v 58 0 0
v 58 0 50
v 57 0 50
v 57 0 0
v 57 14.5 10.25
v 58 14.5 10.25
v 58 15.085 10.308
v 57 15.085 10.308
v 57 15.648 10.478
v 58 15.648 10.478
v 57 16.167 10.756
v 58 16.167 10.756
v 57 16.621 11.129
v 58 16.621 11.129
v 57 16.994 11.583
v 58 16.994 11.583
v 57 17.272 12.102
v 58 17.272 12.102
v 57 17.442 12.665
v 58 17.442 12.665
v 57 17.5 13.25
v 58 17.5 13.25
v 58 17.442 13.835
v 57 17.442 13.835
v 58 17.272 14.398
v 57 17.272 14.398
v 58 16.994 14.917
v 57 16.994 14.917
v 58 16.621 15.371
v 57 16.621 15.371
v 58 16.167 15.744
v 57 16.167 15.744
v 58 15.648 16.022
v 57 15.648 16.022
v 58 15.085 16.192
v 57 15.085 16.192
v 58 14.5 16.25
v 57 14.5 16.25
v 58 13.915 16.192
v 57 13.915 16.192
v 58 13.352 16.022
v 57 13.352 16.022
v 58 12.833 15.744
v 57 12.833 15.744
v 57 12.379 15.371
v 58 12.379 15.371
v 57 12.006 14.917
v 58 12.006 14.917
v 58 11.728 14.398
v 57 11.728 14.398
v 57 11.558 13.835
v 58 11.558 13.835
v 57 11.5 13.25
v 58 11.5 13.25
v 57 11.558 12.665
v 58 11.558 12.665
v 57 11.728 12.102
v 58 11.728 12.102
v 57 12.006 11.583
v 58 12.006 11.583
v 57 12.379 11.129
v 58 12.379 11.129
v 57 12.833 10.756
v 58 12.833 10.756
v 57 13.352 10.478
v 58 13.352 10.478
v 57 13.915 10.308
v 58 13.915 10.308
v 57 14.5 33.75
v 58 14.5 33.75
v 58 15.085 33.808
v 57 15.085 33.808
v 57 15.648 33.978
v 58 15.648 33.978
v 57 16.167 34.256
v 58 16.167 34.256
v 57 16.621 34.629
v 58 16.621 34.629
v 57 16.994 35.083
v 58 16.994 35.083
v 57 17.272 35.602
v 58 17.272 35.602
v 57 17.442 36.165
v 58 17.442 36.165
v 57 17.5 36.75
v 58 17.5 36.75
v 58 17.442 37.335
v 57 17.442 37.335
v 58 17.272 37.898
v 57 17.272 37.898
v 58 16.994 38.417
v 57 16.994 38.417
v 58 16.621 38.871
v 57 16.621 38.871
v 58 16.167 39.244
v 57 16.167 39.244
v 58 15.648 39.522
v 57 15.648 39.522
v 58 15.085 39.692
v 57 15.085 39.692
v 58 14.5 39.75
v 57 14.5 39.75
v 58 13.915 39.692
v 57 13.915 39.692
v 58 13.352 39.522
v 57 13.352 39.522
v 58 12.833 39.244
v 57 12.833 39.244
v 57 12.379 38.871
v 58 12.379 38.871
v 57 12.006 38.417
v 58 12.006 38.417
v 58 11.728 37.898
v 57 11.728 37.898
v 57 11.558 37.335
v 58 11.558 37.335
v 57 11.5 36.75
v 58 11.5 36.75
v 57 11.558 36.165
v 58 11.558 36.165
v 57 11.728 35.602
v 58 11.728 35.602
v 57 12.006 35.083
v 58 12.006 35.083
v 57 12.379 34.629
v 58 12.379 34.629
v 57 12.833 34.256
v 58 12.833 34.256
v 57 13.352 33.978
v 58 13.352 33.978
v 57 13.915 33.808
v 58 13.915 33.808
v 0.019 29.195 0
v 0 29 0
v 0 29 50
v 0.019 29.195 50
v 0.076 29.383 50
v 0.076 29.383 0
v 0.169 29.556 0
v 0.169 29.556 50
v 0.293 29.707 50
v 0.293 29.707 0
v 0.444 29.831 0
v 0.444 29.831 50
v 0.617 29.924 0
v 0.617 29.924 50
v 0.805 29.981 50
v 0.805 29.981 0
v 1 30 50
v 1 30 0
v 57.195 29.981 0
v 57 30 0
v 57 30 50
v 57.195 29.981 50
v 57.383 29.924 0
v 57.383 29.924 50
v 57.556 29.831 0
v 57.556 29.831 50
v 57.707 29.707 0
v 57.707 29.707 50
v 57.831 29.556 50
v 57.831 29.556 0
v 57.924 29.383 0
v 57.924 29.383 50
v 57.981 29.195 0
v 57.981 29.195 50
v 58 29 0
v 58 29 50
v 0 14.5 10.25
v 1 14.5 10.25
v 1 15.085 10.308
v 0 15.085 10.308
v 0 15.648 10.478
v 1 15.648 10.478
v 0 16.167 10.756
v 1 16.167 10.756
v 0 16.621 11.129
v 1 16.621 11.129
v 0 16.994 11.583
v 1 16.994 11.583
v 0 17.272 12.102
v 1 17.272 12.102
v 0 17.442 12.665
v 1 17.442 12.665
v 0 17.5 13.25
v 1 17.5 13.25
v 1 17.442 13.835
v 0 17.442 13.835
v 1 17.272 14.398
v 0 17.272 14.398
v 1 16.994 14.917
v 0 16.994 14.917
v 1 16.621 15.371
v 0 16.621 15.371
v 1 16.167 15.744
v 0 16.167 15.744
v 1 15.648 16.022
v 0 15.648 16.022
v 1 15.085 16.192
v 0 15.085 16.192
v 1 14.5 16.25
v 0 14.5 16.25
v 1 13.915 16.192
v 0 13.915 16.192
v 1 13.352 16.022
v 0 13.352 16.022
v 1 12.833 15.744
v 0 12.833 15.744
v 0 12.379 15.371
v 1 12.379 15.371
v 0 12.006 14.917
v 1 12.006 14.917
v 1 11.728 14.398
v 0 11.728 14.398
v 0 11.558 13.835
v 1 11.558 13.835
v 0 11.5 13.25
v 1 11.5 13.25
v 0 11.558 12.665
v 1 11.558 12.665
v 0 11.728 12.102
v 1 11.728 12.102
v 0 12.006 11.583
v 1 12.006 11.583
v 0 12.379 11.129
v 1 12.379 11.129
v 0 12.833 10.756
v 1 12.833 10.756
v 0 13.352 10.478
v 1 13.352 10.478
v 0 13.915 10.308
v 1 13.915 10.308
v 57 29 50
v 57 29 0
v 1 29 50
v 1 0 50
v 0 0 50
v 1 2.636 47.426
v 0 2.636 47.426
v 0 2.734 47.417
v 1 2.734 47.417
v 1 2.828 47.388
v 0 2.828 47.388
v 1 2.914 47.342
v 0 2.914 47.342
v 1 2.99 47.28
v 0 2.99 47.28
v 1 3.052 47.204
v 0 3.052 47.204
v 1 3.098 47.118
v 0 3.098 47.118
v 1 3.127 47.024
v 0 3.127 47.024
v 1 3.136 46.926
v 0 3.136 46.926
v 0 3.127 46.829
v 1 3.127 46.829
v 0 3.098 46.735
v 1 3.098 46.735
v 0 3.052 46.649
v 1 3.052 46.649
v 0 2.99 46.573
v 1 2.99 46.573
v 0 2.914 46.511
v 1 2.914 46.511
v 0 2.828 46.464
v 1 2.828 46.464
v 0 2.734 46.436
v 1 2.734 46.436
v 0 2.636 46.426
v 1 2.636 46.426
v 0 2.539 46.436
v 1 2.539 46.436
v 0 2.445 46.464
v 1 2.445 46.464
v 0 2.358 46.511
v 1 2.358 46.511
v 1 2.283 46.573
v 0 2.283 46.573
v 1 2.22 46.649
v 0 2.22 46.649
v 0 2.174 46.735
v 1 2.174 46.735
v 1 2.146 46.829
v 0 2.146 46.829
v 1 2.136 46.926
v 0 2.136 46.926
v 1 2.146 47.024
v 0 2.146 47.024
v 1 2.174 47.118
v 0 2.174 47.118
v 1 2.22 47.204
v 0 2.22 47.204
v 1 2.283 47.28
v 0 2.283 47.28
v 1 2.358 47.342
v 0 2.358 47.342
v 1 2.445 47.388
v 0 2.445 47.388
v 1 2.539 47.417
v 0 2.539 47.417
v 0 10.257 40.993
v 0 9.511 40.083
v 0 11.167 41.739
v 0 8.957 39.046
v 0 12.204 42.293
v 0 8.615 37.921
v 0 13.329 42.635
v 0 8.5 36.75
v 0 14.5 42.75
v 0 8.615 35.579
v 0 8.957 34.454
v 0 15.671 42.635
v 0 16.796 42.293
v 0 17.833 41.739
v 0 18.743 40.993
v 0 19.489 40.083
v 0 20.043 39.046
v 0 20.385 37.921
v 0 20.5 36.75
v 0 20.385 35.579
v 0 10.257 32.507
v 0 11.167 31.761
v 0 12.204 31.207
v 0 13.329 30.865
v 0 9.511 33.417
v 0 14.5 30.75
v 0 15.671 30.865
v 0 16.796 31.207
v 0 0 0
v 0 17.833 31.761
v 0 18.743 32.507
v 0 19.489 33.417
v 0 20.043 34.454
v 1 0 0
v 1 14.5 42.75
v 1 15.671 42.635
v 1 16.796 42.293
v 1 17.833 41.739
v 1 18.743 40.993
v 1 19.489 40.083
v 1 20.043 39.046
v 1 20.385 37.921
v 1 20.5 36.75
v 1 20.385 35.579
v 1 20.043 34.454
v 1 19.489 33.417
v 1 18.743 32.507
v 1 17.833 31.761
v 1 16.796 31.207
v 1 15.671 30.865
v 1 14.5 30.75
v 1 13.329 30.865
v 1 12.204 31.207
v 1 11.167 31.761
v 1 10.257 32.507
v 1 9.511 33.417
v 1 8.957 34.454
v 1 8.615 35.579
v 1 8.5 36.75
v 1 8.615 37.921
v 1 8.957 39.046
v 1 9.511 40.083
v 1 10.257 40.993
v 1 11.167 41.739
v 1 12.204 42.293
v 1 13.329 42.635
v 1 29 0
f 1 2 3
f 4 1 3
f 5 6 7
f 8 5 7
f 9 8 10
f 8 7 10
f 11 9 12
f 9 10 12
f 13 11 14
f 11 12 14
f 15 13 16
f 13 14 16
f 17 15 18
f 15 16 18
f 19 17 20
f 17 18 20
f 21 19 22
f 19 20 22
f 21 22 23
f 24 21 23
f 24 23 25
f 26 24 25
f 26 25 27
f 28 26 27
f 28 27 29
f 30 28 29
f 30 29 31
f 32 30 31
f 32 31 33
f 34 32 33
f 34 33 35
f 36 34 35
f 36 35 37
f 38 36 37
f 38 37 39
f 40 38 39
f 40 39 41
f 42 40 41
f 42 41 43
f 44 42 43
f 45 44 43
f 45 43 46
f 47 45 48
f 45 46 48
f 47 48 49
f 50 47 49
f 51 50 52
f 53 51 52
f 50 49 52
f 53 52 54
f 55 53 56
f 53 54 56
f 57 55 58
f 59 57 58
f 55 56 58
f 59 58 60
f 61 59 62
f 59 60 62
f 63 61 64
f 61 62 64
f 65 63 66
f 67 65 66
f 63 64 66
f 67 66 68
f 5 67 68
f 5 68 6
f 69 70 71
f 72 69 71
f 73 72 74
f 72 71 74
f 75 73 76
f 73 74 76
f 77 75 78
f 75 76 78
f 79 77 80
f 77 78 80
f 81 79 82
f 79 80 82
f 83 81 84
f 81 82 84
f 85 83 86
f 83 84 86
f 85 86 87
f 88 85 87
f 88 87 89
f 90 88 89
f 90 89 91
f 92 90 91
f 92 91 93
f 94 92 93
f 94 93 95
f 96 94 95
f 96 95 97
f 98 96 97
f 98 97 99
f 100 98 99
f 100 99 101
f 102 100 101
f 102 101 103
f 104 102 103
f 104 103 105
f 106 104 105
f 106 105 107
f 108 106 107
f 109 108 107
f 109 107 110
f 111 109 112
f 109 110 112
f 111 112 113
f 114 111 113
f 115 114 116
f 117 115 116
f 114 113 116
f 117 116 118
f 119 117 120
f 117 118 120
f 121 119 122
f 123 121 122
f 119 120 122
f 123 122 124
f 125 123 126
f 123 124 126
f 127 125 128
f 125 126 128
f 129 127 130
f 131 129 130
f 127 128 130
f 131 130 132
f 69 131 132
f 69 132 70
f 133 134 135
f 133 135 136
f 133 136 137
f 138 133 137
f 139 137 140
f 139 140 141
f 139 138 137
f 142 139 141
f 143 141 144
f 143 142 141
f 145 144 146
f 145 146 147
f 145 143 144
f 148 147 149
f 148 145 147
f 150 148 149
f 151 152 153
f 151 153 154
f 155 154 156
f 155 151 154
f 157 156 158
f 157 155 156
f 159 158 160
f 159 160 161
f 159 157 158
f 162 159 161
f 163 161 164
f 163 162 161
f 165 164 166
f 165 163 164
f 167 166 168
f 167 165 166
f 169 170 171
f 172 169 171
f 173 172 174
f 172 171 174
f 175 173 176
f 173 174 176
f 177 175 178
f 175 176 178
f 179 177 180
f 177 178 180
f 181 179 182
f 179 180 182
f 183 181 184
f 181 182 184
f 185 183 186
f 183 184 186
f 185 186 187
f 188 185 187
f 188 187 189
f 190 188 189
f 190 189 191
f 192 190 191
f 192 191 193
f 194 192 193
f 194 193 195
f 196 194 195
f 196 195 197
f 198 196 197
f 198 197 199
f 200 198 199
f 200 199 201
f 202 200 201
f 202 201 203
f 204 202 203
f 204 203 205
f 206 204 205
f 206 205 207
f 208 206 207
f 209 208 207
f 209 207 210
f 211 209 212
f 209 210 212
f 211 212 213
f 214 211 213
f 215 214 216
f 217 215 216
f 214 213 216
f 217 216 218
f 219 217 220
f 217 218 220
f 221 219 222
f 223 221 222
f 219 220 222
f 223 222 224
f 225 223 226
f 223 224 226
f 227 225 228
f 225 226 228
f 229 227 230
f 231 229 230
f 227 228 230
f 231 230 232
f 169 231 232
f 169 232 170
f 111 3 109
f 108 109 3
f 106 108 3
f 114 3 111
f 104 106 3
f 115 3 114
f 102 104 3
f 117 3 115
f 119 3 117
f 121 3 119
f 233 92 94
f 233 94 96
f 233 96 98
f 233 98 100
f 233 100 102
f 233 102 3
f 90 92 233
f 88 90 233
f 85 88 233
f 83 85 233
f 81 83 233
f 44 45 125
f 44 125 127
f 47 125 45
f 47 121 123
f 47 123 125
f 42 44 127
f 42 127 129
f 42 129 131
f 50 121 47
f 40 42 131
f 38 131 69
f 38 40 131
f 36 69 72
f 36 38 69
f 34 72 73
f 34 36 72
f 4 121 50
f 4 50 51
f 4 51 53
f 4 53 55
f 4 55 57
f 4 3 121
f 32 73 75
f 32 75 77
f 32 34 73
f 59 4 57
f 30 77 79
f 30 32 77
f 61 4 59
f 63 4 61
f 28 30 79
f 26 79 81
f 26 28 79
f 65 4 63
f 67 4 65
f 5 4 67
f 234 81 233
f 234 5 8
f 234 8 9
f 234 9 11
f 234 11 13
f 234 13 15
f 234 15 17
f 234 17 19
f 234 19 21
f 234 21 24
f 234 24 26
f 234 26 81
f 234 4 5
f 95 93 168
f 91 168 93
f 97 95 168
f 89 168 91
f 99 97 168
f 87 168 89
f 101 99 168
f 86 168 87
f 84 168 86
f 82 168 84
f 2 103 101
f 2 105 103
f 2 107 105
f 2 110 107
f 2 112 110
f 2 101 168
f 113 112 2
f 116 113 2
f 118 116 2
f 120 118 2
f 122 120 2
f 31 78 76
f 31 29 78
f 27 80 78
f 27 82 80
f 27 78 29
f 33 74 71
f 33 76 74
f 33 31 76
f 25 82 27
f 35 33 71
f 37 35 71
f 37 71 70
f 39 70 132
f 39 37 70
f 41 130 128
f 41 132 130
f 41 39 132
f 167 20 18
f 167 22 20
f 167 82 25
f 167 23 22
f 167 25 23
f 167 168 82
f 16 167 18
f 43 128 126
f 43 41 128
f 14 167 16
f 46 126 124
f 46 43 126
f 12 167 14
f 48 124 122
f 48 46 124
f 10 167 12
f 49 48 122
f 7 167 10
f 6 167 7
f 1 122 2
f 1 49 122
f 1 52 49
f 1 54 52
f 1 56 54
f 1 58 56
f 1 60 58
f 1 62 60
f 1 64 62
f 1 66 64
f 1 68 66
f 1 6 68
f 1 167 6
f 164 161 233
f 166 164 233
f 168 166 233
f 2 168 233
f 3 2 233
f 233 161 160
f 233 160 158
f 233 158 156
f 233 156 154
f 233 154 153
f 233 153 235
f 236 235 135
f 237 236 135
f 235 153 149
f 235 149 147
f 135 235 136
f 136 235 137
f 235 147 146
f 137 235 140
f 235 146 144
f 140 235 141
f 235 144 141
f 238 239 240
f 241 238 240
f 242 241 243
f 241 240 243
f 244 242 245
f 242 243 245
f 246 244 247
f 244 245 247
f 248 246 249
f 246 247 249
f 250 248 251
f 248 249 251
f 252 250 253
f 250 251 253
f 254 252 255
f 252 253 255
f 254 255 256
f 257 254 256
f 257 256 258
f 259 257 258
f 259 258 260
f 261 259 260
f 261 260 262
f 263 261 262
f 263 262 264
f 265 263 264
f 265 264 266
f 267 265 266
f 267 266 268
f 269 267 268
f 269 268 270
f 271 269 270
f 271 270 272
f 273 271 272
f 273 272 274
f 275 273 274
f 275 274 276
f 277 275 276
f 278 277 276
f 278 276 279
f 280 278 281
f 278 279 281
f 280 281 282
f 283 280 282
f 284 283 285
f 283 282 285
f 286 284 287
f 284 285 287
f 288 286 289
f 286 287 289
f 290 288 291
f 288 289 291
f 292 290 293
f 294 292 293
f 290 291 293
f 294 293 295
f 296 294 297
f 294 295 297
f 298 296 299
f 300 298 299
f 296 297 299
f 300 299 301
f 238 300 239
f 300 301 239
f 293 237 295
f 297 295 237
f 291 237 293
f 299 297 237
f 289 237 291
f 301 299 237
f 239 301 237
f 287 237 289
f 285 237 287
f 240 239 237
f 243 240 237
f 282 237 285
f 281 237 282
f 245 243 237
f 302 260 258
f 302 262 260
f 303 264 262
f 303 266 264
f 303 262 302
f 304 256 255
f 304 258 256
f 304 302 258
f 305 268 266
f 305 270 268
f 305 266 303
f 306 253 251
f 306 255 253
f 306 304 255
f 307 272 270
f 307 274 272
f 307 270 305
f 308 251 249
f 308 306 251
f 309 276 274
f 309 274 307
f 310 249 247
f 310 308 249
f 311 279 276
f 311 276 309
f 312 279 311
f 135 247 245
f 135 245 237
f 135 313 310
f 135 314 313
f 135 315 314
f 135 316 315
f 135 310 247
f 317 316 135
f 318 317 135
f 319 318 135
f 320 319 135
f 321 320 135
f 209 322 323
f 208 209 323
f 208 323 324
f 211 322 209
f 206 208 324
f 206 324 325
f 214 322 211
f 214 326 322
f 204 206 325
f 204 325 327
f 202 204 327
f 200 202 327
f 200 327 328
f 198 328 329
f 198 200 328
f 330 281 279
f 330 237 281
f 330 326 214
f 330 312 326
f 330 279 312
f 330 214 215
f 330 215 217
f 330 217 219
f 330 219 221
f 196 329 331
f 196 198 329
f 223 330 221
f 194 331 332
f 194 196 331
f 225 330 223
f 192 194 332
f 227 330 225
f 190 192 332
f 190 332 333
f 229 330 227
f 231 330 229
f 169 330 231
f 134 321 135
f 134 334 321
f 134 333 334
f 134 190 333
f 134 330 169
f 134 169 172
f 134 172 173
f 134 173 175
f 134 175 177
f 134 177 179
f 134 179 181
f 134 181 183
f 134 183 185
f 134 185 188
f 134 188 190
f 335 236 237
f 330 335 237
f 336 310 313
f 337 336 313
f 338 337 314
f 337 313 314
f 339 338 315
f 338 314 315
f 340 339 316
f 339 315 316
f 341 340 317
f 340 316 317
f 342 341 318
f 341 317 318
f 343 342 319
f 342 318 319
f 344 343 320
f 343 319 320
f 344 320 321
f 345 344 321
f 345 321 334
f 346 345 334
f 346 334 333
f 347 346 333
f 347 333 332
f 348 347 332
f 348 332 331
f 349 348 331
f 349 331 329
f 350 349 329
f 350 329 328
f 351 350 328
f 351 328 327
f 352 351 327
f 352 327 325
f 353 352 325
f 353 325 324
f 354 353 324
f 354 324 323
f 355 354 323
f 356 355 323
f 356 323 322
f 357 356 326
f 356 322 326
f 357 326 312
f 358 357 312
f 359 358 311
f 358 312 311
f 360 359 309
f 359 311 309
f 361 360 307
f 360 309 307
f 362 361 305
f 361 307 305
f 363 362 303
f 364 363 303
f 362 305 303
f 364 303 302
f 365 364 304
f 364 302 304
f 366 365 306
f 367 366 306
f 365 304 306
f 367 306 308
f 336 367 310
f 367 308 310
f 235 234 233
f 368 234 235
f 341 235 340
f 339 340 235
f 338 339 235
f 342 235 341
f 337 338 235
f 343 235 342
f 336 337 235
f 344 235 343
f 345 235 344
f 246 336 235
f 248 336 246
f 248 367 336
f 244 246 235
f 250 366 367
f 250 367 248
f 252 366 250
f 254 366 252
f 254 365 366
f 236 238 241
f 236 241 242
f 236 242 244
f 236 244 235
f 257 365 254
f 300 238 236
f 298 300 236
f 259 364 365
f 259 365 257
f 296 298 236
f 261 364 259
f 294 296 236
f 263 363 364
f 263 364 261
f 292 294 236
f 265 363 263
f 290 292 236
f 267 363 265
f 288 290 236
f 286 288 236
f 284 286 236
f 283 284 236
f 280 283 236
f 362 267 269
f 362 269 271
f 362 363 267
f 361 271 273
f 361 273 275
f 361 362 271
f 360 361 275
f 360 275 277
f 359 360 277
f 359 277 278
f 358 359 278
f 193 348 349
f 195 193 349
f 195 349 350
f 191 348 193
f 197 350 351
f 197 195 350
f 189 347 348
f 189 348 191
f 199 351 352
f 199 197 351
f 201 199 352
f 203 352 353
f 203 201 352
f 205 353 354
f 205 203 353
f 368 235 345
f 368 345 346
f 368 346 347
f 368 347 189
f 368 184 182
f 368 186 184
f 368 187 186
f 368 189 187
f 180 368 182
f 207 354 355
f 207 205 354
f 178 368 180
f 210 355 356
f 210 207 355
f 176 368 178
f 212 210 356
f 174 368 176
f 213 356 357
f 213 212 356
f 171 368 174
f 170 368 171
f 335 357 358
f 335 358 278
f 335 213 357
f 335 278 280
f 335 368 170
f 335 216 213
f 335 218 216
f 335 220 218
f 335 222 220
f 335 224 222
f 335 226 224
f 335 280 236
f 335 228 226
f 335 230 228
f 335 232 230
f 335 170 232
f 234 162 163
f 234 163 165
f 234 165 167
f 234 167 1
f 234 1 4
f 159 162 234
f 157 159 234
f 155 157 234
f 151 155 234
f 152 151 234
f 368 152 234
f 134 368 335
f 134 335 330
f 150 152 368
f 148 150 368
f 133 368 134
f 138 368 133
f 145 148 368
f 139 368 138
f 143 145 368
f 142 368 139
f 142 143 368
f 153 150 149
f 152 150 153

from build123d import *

# Parameters (mm, degrees)
EKSTR_ZYON_NCE1_DEPTH = 50
IZIM2_R               = 3
KES_EKSTR_ZYON1_DEPTH = 78
IZIM3_R               = 0.5
KES_EKSTR_ZYON2_DEPTH = 22
IZIM4_R               = 6
KES_EKSTR_ZYON3_DEPTH = 22


with BuildPart() as part:
    # Çizim1 → Ekstrüzyon-İnce1 (new body)
    with BuildSketch(Plane.XY):
        with BuildLine():
            Line((0, 0), (0, 29))
            ThreePointArc((0, 29), (0.292893219, 29.707106781), (1, 30))
            Line((1, 30), (57, 30))
            ThreePointArc((57, 30), (57.707106781, 29.707106781), (58, 29))
            Line((58, 29), (58, 0))
            Line((58, 0), (57, 0))
            Line((57, 0), (57, 29))
            Line((57, 29), (1, 29))
            Line((1, 29), (1, 0))
            Line((1, 0), (0, 0))
        make_face()
    extrude(amount=EKSTR_ZYON_NCE1_DEPTH)

    # Çizim2 → Kes-Ekstrüzyon1 (cut)
    with BuildSketch(Plane(origin=(58, 0, 0), x_dir=(0, 0, -1), z_dir=(1, 0, 0))):
        with Locations((-36.75, 14.5)):
            Circle(IZIM2_R)
        with Locations((-13.25, 14.5)):
            Circle(IZIM2_R)
    extrude(amount=-KES_EKSTR_ZYON1_DEPTH, mode=Mode.SUBTRACT)

    # Çizim3 → Kes-Ekstrüzyon2 (cut)
    with BuildSketch(Plane.ZY):
        with Locations((46.926319902, 2.636193895)):
            Circle(IZIM3_R)
    extrude(amount=-KES_EKSTR_ZYON2_DEPTH, mode=Mode.SUBTRACT)

    # Çizim4 → Kes-Ekstrüzyon3 (cut)
    with BuildSketch(Plane.ZY):
        with Locations((36.75, 14.5)):
            Circle(IZIM4_R)
    extrude(amount=-KES_EKSTR_ZYON3_DEPTH, mode=Mode.SUBTRACT)


solid = part.part
